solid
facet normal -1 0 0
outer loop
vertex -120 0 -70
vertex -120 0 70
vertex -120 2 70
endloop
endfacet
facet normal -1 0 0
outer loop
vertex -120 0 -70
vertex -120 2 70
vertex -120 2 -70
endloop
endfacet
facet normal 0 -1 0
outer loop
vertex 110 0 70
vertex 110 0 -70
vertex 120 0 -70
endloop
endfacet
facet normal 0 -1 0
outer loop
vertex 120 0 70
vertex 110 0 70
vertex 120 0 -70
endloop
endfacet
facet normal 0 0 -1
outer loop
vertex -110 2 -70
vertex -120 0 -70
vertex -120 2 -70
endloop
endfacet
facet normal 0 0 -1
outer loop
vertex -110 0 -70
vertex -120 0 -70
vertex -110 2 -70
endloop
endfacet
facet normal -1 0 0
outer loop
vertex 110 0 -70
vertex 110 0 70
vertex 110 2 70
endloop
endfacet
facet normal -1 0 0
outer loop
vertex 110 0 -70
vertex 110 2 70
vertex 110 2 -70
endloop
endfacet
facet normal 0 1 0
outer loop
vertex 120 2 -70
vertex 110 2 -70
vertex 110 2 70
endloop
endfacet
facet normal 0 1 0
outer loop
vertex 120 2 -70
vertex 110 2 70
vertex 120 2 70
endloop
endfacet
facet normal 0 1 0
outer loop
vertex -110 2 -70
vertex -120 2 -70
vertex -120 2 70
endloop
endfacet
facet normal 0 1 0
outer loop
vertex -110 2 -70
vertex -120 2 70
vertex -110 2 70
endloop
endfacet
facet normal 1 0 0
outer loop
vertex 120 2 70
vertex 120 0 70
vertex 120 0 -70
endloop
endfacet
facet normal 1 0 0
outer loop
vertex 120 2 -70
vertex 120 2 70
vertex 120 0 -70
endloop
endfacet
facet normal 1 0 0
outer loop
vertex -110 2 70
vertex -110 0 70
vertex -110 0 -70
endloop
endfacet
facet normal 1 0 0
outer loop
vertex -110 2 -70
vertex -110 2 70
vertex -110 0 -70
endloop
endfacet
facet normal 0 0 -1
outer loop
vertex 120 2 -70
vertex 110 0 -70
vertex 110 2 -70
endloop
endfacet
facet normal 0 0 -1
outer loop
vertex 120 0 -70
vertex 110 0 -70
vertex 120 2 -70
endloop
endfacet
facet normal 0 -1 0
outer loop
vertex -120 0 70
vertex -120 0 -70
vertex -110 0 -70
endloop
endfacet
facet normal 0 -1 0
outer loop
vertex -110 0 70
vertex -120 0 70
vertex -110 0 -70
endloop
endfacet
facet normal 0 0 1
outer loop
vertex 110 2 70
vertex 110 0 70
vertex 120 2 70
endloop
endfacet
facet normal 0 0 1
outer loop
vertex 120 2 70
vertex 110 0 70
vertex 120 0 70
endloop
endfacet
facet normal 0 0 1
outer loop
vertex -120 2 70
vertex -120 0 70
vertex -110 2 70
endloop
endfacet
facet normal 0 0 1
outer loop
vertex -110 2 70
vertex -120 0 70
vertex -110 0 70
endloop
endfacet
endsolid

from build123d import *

# Parameters (mm, degrees)
SKETCH1_W           = 240
SKETCH1_H           = 140
BOSS_EXTRUDE1_DEPTH = 2
SKETCH2_W           = 220
SKETCH2_H           = 140
CUT_EXTRUDE1_DEPTH  = 2


with BuildPart() as part:
    # Sketch1 → Boss-Extrude1 (new body)
    with BuildSketch(Plane(origin=(0, 0, 0), x_dir=(1, 0, 0), z_dir=(0, 1, 0))):
        Rectangle(SKETCH1_W, SKETCH1_H)
    extrude(amount=BOSS_EXTRUDE1_DEPTH)

    # Sketch2 → Cut-Extrude1 (cut)
    with BuildSketch(Plane(origin=(0, 0, 0), x_dir=(1, 0, 0), z_dir=(0, 1, 0))):
        Rectangle(SKETCH2_W, SKETCH2_H)
    extrude(amount=CUT_EXTRUDE1_DEPTH, mode=Mode.SUBTRACT)


with BuildPart() as cut_extrude1_piece_1:
    # of the separate pieces the step leaves, piece 1, a body of its own (cut_extrude1_pieces)
    add(part.part.solids().sort_by_distance((-110, 0, 70))[0])


with BuildPart() as cut_extrude1_piece_2:
    # of the separate pieces the step leaves, piece 2, a body of its own (cut_extrude1_pieces)
    add(part.part.solids().sort_by_distance((120, 0, 70))[0])


solid = Compound([cut_extrude1_piece_1.part, cut_extrude1_piece_2.part])
